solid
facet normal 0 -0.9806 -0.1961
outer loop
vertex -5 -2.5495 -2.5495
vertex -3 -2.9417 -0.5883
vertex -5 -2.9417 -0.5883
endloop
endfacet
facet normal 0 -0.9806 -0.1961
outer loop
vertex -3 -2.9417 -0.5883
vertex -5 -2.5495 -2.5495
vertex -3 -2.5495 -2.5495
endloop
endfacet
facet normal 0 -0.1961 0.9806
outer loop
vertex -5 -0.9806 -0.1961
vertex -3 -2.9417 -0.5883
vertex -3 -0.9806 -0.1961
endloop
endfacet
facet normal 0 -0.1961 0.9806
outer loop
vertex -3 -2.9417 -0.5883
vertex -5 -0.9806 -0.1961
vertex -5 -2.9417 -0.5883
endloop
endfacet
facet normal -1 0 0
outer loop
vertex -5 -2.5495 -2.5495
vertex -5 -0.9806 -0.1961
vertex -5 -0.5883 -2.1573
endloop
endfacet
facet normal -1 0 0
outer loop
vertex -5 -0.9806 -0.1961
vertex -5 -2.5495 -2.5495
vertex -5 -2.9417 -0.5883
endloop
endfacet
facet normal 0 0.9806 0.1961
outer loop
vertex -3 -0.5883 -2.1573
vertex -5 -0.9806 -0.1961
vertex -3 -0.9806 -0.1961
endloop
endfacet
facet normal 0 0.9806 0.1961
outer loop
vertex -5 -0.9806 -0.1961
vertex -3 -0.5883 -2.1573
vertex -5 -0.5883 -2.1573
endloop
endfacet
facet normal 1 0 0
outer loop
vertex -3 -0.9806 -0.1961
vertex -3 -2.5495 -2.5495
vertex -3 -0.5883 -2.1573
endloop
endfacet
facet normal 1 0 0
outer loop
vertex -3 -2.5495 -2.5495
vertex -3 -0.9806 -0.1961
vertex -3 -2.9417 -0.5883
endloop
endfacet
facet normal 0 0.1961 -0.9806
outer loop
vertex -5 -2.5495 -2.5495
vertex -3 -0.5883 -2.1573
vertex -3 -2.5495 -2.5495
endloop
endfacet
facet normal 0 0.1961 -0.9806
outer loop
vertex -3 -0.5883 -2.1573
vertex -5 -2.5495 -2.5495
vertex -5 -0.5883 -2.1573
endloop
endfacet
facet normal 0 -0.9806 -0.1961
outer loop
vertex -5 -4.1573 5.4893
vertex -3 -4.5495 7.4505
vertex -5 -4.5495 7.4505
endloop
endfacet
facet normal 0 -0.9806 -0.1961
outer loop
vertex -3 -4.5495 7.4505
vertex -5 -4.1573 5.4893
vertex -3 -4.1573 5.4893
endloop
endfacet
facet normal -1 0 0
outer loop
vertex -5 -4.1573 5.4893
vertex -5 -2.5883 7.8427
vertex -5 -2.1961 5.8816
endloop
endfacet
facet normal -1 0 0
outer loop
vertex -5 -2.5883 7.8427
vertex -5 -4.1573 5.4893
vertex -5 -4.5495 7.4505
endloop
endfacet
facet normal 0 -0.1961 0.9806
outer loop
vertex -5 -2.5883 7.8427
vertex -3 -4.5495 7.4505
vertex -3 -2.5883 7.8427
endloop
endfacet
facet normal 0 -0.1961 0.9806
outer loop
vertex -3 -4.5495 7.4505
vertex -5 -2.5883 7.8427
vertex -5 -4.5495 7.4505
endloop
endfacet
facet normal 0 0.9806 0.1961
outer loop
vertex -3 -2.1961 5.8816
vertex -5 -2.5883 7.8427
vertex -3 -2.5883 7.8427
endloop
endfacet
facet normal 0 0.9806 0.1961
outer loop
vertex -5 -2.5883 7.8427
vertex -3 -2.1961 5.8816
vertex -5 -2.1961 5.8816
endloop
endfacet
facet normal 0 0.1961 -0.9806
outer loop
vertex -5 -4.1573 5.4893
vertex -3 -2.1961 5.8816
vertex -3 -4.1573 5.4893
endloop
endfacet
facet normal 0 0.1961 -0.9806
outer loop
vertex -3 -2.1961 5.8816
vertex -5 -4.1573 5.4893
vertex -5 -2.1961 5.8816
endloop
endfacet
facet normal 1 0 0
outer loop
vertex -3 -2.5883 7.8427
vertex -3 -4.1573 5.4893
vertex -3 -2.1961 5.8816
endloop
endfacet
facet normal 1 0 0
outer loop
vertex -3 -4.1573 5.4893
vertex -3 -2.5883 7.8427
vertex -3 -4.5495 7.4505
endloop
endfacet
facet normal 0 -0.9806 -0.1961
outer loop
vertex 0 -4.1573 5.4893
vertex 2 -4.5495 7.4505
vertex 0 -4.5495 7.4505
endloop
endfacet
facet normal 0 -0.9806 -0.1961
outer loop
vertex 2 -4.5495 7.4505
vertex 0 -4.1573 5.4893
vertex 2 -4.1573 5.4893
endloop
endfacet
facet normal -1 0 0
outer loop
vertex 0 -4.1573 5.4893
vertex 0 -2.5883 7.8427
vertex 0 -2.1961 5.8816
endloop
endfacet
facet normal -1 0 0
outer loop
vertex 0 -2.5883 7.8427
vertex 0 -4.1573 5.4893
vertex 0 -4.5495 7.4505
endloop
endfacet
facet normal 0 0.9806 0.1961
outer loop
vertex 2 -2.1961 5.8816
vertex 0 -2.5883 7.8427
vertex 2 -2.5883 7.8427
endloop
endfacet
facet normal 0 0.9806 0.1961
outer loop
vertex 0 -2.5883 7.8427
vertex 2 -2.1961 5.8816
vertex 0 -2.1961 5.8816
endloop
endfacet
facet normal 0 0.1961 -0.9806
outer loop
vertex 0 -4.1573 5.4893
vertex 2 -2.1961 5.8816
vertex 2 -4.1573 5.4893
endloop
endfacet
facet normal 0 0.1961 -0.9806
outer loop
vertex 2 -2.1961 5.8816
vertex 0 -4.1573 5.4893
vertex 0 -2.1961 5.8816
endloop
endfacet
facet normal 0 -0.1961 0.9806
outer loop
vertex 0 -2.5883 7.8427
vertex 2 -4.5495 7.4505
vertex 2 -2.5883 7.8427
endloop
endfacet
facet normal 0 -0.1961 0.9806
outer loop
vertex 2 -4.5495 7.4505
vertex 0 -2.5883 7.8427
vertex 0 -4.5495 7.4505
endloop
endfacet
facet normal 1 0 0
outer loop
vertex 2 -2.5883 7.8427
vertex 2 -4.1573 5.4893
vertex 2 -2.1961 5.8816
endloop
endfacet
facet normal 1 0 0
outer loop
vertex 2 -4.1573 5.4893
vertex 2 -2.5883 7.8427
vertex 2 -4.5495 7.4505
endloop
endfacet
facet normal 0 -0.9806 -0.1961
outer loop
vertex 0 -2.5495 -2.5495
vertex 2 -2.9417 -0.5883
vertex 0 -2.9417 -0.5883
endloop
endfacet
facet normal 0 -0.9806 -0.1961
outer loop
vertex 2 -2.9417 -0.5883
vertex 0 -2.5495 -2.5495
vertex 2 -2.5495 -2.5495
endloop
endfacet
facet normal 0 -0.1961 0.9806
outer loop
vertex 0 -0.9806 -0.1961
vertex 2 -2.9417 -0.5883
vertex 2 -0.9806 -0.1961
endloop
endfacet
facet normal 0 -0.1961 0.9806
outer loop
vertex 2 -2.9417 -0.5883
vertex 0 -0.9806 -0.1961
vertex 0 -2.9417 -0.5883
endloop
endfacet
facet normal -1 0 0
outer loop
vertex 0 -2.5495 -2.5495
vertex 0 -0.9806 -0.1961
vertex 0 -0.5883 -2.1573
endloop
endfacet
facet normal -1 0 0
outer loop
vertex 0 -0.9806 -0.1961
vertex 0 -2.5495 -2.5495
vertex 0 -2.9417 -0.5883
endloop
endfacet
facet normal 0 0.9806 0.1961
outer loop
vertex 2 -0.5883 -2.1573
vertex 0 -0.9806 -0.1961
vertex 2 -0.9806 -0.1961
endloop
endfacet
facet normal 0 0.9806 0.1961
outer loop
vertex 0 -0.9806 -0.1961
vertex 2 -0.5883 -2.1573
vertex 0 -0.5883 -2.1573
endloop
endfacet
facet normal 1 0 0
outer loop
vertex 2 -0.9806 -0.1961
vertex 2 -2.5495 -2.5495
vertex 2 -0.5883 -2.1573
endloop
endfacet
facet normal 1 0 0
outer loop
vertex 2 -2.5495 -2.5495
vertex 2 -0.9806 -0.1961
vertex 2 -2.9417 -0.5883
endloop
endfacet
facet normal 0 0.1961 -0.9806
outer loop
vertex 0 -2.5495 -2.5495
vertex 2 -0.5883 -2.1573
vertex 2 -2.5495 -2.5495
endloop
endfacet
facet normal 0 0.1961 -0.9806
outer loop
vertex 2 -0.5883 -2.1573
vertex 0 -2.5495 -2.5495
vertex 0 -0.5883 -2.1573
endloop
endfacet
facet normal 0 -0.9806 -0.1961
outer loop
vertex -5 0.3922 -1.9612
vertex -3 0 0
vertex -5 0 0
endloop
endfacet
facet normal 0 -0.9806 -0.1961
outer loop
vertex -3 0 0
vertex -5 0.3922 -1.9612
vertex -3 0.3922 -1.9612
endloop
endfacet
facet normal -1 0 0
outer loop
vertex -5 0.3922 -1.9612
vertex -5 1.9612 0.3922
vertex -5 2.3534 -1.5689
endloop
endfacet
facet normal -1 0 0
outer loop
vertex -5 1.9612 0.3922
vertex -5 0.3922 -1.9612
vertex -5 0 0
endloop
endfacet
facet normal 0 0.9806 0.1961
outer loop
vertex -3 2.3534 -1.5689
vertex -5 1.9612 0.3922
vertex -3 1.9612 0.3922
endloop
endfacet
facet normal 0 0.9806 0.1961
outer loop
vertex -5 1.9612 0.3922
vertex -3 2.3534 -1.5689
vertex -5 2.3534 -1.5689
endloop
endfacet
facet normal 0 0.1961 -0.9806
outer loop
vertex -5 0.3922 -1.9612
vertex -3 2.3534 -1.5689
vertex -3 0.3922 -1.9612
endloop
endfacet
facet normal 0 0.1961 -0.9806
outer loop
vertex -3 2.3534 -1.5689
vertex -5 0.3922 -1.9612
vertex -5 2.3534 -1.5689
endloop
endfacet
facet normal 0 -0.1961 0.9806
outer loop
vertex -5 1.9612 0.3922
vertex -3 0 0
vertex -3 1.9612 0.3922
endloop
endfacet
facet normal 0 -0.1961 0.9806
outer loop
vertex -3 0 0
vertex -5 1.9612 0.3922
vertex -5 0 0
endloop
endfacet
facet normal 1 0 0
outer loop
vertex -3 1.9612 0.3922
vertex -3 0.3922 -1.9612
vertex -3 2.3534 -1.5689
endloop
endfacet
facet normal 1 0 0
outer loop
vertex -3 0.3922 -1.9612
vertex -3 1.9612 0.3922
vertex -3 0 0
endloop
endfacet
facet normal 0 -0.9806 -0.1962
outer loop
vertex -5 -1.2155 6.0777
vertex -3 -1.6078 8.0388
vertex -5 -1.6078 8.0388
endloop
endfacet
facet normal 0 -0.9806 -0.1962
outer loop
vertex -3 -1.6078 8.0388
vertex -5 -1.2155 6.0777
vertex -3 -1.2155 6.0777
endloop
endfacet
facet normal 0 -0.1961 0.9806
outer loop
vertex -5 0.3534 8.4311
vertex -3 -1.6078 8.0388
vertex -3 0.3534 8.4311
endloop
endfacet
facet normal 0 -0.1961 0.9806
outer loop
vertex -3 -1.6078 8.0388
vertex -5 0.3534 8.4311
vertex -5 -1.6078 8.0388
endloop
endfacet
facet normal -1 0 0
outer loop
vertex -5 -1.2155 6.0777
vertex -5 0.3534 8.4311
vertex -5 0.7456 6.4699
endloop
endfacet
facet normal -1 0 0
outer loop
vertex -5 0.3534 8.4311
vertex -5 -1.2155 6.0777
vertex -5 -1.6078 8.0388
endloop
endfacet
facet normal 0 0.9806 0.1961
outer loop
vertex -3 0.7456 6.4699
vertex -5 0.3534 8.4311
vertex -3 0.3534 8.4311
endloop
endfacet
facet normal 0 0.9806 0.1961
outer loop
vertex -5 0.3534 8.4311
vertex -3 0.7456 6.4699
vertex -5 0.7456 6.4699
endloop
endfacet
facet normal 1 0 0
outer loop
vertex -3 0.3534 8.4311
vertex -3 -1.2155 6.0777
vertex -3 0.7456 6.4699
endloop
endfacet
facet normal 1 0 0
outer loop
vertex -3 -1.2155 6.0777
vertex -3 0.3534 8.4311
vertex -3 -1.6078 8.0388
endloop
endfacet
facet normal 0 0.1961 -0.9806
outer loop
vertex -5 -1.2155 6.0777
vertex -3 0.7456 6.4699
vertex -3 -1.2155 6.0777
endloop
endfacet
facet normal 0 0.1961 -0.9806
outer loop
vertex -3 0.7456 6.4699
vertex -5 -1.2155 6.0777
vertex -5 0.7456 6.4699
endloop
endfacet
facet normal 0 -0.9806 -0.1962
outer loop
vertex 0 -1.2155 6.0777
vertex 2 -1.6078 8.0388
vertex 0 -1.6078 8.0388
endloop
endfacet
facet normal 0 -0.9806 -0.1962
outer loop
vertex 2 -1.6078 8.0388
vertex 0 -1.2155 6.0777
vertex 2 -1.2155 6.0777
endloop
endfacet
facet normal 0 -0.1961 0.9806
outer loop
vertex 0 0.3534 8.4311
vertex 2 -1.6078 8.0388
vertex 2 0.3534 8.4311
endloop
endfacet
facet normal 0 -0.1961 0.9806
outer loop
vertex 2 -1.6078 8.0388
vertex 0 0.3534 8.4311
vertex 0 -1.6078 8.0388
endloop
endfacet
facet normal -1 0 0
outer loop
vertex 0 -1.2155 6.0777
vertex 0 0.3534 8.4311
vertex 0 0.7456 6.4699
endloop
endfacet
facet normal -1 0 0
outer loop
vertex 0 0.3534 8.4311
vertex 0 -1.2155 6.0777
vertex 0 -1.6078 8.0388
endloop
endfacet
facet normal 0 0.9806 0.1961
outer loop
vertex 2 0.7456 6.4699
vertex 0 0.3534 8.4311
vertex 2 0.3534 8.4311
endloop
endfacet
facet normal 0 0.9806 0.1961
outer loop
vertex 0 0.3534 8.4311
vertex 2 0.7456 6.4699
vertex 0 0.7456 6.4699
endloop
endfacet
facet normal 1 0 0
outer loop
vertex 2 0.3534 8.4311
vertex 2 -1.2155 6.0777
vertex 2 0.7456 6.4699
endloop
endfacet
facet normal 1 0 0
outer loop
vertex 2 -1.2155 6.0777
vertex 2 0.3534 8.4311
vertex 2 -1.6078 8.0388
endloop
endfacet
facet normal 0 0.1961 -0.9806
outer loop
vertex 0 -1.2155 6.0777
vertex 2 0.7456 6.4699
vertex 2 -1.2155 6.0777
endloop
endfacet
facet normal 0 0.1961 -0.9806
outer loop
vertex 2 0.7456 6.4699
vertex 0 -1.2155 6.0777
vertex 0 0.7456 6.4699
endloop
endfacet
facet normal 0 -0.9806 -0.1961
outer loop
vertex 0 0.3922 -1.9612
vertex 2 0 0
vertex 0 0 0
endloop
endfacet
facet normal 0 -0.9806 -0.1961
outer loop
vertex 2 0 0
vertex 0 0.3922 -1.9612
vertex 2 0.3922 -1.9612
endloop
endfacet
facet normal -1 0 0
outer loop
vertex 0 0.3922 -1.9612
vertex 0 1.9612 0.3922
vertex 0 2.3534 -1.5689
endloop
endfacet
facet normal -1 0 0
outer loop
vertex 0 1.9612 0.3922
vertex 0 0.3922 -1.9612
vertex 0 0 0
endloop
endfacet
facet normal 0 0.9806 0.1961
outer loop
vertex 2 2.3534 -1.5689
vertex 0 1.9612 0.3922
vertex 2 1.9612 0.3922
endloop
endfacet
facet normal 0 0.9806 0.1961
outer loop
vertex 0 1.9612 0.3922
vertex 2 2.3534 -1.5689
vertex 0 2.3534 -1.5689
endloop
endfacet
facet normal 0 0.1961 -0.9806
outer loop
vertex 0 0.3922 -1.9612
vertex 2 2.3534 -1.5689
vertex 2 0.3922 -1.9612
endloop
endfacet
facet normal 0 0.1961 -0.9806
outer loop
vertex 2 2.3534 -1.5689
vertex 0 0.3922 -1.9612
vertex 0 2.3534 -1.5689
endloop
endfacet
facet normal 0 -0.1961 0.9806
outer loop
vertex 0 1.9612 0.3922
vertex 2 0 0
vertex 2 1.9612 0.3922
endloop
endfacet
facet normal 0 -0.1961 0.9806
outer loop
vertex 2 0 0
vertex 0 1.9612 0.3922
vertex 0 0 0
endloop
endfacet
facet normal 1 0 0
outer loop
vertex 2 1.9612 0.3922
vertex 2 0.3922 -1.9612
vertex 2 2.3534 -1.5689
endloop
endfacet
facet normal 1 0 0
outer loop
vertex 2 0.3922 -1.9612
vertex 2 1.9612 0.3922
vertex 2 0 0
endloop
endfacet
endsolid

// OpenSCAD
$fn=7;
union()
{
	union()
	{
		translate([-5,-0.58834815,-2.1572776])
		{
			rotate(101.30993,[1,0,0])
			{
				cube([2,2,2]);
			}
		}
		translate([-5,-2.1961162,5.881561])
		{
			rotate(101.30993,[1,0,0])
			{
				cube([2,2,2]);
			}
		}
		translate([0,-2.1961162,5.881561])
		{
			rotate(101.30993,[1,0,0])
			{
				cube([2,2,2]);
			}
		}
		translate([0,-0.58834815,-2.1572776])
		{
			rotate(101.30993,[1,0,0])
			{
				cube([2,2,2]);
			}
		}
	}
	union()
	{
		translate([-5,2.3533938,-1.568929])
		{
			rotate(101.30993,[1,0,0])
			{
				cube([2,2,2]);
			}
		}
		translate([-5,0.74562573,6.4699097])
		{
			rotate(101.30993,[1,0,0])
			{
				cube([2,2,2]);
			}
		}
		translate([0,0.74562573,6.4699097])
		{
			rotate(101.30993,[1,0,0])
			{
				cube([2,2,2]);
			}
		}
		translate([0,2.3533938,-1.568929])
		{
			rotate(101.30993,[1,0,0])
			{
				cube([2,2,2]);
			}
		}
	}
}
